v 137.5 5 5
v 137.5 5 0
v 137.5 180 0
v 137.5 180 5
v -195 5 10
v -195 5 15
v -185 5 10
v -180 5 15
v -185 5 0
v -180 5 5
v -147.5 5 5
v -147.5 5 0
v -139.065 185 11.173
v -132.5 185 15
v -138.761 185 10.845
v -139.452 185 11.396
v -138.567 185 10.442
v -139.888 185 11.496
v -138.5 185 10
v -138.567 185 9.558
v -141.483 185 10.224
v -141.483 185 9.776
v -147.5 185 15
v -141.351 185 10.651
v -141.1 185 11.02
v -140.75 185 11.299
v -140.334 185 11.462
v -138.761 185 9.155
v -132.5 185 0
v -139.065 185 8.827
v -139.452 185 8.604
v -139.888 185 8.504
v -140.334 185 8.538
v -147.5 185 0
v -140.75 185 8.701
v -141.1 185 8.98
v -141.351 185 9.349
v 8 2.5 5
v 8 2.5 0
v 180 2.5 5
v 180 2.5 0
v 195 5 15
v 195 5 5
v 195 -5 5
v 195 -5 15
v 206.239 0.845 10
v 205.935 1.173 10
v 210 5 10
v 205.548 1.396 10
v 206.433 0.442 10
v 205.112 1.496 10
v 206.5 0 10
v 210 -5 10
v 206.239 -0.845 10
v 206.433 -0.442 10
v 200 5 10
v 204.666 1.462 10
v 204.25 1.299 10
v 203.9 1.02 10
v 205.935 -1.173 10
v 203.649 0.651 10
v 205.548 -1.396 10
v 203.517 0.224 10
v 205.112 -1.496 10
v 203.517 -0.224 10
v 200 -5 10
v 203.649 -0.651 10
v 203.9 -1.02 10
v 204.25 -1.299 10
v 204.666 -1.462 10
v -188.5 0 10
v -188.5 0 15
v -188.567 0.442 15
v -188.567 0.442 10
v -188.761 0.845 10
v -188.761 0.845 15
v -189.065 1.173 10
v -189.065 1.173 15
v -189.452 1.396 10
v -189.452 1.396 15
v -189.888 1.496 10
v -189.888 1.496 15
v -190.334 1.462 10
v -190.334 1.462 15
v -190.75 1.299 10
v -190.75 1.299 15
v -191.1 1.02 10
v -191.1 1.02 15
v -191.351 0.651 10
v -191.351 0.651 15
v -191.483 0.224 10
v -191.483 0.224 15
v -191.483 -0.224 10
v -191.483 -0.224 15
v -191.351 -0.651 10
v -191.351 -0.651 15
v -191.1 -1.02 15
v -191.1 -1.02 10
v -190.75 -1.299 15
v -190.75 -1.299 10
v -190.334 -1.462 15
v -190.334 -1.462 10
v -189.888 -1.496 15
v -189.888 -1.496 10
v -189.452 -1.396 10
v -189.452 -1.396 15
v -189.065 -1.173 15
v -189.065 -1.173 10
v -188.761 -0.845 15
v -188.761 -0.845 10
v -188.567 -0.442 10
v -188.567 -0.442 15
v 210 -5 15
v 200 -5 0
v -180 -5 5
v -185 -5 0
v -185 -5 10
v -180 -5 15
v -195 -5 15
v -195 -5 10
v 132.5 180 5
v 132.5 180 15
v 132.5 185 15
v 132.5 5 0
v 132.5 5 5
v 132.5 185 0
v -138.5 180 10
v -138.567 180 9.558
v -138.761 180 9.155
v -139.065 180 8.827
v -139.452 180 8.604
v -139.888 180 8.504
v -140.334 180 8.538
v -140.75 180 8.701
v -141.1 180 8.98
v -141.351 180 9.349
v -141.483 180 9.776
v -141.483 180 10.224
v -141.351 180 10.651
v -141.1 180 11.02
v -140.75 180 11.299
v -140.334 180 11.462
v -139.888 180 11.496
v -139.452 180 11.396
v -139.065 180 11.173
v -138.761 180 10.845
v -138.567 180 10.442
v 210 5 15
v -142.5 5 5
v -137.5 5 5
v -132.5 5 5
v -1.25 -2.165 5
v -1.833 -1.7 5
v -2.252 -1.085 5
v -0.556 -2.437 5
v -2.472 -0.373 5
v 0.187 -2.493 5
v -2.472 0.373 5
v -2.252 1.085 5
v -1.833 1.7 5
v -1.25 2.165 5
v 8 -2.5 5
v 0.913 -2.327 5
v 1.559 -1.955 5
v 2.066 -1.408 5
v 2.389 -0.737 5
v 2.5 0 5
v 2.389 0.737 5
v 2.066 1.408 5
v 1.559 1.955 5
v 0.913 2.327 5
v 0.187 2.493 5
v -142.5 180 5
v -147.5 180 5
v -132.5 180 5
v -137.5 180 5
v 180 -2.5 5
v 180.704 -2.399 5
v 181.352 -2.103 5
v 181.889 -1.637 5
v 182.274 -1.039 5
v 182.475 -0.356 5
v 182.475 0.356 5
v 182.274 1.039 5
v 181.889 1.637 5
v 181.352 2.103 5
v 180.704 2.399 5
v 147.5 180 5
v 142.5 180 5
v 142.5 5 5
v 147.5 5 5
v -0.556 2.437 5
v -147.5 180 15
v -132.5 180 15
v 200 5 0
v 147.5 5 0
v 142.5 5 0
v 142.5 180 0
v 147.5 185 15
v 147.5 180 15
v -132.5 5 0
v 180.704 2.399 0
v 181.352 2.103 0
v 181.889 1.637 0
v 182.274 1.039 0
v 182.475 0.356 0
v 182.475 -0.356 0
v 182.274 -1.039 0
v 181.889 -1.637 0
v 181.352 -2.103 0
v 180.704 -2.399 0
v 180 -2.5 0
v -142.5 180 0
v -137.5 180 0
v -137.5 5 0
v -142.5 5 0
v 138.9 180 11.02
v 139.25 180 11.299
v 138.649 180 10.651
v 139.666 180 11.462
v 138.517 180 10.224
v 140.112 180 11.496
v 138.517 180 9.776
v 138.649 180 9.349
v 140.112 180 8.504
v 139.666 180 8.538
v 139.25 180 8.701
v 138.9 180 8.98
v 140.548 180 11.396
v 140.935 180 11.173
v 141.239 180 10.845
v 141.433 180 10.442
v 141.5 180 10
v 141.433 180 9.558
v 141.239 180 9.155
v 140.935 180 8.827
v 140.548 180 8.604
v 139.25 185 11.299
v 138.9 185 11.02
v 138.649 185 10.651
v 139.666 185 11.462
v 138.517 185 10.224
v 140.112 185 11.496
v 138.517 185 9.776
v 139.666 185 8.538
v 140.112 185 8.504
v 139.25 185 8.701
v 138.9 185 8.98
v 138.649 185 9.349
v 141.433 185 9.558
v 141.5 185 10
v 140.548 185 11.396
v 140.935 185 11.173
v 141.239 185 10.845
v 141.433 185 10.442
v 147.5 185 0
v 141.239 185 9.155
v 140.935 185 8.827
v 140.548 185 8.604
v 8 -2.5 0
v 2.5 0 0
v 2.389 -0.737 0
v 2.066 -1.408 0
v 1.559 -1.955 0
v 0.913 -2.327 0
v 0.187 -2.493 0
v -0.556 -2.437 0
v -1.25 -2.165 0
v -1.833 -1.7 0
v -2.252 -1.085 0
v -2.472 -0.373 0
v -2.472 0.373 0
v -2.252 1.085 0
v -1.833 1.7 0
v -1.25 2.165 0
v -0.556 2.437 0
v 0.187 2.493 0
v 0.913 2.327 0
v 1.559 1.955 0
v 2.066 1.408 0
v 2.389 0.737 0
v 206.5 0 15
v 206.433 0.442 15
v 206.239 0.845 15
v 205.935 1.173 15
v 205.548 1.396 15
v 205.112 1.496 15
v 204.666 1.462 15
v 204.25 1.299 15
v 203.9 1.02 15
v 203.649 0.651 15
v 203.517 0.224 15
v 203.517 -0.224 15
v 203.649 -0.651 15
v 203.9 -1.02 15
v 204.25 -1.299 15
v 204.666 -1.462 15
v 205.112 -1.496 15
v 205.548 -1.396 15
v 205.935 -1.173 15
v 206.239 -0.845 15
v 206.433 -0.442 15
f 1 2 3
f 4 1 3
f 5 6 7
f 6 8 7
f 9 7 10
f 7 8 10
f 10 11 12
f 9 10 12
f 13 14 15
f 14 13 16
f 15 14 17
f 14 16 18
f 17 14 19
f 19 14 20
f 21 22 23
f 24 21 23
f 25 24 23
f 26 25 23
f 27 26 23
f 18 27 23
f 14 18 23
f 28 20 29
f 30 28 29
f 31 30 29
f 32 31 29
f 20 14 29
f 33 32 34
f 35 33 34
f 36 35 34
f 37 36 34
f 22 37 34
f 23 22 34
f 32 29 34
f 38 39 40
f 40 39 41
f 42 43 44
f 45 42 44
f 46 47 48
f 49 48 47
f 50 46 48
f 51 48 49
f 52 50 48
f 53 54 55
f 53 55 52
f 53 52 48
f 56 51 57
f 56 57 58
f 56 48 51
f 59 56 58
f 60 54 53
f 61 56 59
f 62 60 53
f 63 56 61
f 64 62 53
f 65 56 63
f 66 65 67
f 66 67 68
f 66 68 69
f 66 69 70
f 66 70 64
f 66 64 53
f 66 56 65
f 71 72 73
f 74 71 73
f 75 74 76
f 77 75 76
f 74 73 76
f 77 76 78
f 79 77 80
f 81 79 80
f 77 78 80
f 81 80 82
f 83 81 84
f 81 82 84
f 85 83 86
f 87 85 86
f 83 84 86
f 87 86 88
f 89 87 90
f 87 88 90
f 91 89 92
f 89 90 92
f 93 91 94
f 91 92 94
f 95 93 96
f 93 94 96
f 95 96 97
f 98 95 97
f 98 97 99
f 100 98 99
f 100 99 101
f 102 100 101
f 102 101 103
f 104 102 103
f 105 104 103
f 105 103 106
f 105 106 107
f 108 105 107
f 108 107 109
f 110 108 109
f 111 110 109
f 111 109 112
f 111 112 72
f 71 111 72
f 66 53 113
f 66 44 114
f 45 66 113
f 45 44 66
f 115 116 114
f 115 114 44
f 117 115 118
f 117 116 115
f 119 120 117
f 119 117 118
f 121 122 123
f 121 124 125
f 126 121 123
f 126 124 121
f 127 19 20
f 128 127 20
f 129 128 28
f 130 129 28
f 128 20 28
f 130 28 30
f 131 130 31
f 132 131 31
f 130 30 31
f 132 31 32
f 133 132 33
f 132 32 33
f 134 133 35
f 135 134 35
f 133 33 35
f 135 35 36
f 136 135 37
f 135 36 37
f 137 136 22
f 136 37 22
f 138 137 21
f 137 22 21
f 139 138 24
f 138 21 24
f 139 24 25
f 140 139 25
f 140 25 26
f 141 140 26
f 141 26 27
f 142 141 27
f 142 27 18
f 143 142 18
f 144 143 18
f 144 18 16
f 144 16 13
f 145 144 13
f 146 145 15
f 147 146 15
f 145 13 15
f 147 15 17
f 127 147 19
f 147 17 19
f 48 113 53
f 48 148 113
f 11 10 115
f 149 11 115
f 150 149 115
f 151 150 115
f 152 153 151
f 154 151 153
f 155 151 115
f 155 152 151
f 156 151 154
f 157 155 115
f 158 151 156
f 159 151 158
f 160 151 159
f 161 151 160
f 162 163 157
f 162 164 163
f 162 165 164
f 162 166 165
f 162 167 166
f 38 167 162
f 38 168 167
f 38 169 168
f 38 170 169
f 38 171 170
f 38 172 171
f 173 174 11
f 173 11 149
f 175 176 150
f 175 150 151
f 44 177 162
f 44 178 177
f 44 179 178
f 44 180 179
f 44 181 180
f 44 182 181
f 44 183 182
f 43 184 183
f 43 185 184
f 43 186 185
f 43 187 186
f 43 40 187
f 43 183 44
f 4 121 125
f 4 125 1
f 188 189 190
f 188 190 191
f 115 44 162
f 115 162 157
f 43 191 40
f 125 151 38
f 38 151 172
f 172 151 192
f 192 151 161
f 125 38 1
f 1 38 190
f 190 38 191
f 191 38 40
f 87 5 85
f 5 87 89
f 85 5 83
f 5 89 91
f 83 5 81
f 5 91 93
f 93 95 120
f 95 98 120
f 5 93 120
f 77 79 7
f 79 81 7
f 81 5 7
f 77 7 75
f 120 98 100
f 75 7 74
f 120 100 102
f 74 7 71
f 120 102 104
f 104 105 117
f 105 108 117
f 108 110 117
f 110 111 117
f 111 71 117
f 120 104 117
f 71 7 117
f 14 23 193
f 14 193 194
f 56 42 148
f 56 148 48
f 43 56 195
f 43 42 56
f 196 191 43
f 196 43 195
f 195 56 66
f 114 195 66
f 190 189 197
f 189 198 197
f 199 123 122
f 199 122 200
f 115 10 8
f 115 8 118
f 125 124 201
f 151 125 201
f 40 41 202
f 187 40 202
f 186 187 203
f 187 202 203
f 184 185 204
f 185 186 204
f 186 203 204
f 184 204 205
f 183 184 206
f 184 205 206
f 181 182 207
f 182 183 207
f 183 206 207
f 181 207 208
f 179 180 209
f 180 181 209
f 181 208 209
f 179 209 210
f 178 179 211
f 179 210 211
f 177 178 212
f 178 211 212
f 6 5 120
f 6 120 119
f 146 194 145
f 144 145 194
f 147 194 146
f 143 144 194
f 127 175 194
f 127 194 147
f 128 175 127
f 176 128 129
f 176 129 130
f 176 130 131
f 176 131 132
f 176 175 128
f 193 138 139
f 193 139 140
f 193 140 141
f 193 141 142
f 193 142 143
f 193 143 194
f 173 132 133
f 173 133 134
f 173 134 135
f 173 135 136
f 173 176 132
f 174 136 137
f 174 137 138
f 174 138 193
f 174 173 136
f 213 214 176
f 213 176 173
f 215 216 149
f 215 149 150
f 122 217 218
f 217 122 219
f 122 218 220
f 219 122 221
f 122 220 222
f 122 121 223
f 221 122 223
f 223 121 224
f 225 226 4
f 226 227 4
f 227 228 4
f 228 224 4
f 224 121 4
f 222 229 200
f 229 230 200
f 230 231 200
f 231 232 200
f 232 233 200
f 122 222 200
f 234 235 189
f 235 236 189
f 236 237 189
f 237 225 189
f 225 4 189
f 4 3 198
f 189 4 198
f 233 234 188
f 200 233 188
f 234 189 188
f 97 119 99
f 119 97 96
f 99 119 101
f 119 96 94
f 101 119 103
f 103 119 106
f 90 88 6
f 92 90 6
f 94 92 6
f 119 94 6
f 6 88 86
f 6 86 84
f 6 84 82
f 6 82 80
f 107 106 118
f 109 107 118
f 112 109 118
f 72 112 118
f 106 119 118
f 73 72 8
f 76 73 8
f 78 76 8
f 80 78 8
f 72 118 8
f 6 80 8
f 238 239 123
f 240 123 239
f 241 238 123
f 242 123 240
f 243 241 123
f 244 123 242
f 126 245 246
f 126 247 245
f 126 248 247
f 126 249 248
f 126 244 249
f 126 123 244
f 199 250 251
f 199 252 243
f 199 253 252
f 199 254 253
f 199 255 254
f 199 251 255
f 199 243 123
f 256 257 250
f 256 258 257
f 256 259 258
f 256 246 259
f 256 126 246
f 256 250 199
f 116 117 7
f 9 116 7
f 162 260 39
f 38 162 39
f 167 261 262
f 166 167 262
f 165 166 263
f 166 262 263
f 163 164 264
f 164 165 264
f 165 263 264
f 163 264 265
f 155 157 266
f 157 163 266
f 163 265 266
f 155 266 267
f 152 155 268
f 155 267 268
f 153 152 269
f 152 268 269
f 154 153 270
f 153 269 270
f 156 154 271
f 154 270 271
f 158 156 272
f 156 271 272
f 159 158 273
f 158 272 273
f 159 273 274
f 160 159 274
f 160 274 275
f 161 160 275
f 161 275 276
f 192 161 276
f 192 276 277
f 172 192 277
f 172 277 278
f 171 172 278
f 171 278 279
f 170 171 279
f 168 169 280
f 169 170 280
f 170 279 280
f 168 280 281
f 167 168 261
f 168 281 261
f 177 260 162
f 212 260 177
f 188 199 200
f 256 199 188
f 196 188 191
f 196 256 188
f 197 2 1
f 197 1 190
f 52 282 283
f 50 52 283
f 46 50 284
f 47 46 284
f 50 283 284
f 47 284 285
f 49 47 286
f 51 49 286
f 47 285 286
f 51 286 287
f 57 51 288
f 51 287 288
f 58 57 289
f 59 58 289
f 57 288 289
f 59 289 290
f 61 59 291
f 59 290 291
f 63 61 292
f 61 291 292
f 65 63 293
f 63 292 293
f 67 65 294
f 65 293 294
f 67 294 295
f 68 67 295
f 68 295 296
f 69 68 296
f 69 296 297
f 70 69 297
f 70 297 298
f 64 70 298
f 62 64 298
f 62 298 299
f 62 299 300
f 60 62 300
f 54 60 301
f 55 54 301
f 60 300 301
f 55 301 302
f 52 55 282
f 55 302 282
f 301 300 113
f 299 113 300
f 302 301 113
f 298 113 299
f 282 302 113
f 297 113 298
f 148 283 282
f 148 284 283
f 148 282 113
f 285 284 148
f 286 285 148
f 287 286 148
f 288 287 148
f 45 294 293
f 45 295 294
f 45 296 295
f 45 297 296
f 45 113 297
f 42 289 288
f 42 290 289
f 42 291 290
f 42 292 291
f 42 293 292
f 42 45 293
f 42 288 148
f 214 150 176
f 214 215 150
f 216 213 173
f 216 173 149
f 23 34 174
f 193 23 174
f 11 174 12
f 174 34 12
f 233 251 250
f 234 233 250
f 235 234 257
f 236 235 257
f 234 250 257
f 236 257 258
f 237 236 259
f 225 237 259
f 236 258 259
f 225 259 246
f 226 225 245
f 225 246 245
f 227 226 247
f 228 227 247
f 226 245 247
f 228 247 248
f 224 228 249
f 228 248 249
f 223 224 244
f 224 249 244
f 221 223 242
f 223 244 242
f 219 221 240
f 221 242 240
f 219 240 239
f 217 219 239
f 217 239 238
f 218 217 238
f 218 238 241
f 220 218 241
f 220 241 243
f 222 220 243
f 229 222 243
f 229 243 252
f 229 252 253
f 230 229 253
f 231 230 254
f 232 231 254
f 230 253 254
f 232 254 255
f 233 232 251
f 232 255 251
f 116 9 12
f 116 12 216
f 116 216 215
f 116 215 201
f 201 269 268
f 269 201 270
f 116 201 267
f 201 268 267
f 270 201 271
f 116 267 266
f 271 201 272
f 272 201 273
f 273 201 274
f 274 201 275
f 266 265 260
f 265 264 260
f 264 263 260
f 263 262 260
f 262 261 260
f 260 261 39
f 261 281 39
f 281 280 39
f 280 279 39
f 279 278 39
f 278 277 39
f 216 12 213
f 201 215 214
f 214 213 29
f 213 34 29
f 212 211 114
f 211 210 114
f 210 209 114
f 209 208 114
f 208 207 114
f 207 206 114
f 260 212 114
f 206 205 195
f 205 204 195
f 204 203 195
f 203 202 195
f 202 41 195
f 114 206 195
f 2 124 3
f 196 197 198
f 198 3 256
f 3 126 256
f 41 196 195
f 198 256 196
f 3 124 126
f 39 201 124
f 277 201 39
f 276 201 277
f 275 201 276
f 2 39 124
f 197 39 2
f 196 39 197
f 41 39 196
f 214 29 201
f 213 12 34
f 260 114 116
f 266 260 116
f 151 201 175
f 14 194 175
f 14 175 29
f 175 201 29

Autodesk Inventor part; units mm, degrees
ref_plane "YZ Plane" through (0, 0, 0) normal (1, 0, 0) x (0, 1, 0)
ref_plane "XZ Plane" through (0, 0, 0) normal (0, 1, 0) x (-1, 0, 0)
ref_plane "XY Plane" through (0, 0, 0) normal (0, 0, 1) x (1, 0, 0)
sketch "Boceto1" plane through (0, 0, 0) normal (0, 0, 1) x (1, 0, 0)
  line L0 (5, -5) -> (165, -5)
  line L1 (165, -2.5) -> (8, -2.5)
  line L2 (8, -2.5) -> (8, 2.5)
  line L3 (8, 2.5) -> (165, 2.5)
  line L4 (140, 5) -> (142.5, 5)
  line L5 (142.5, 5) -> (137.5, 5)
  line L6 (137.5, 5) -> (137.5, 180)
  line L7 (142.5, 180) -> (142.5, 5)
  line L8 (132.5, 185) -> (147.5, 185)
  line L9 (147.5, 185) -> (147.5, 5)
  line L10 (142.5, 5) -> (137.5, 5)
  line L11 (132.5, 5) -> (132.5, 185)
  line L12 (137.5, 180) -> (142.5, 180)
  line L13 (147.5, 5) -> (165, 5)
  line L14 (0, 5) -> (132.5, 5)
  line L15 (137.5, 5) -> (142.5, 5)
  arc A0 (-165, 5) -> (-165, -5) centre (-165, 0) ccw
  line L16 (5, -5) -> (-165, -5)
  line L17 (-140, 5) -> (-142.5, 5)
  line L18 (-142.5, 5) -> (-137.5, 5)
  line L19 (-137.5, 5) -> (-137.5, 180)
  line L20 (-142.5, 180) -> (-142.5, 5)
  line L21 (-132.5, 185) -> (-147.5, 185)
  line L22 (-147.5, 185) -> (-147.5, 5)
  line L23 (-142.5, 5) -> (-137.5, 5)
  line L24 (-132.5, 5) -> (-132.5, 185)
  line L25 (-137.5, 180) -> (-142.5, 180)
  line L26 (-147.5, 5) -> (-165, 5)
  line L27 (0, 5) -> (-132.5, 5)
  line L28 (-137.5, 5) -> (-142.5, 5)
  line L29 (0, 0) -> (-5, 0) construction
  circle A1 centre (0, 0) radius 2.5
  arc A2 (180, -2.5) -> (180, 2.5) centre (180, 0) ccw
  line L30 (180, 5) -> (165, 5)
  line L31 (165, 2.5) -> (180, 2.5)
  line L32 (165, -2.5) -> (180, -2.5)
  line L33 (165, -5) -> (180, -5)
  arc A3 (180, -5) -> (180, 5) centre (180, 0) ccw
  dimension "d13" = 15
  dimension "d17" = 180
  dimension "d18" = 175
  dimension "d31" = 10
  dimension "d36" = 5
  dimension "d40" = 5
extrude "Extrusión1" add sketch "Boceto1" along normal blind 5
sketch "Sketch4" plane through (0, 0, 5) normal (0, 0, 1) x (1, 0, 0)
  line L0 (-132.5, 185) -> (-147.5, 185) projected
  line L1 (-132.5, 5) -> (-132.5, 185) projected
  line L2 (-147.5, 185) -> (-132.5, 185)
  line L3 (-132.5, 185) -> (-132.5, 180)
  line L4 (-132.5, 180) -> (-147.5, 180)
  line L5 (-147.5, 180) -> (-147.5, 185)
  line L6 (180, 5) -> (147.5, 5) projected
  line L7 (147.5, 5) -> (147.5, 185) projected
  line L8 (147.5, 185) -> (132.5, 185) projected
  line L9 (132.5, 185) -> (132.5, 5) projected
  line L10 (132.5, 5) -> (-132.5, 5) projected
  line L11 (-132.5, 5) -> (-132.5, 185) projected
  line L12 (-132.5, 185) -> (-147.5, 185) projected
  line L13 (-147.5, 185) -> (-147.5, 5) projected
  line L14 (-147.5, 5) -> (-165, 5) projected
  arc A0 (-165, 5) -> (-165, -5) centre (-165, 0) ccw projected
  line L15 (-165, -5) -> (180, -5) projected
  line L16 (-142.5, 5) -> (-142.5, 180) projected
  line L17 (-142.5, 180) -> (-137.5, 180) projected
  line L18 (-137.5, 180) -> (-137.5, 5) projected
  line L19 (-137.5, 5) -> (-142.5, 5) projected
  line L20 (142.5, 180) -> (142.5, 5) projected
  line L21 (142.5, 5) -> (137.5, 5) projected
  line L22 (137.5, 5) -> (137.5, 180) projected
  line L23 (137.5, 180) -> (142.5, 180) projected
  line L24 (132.5, 185) -> (147.5, 185)
  line L25 (147.5, 185) -> (147.5, 180)
  line L26 (147.5, 180) -> (132.5, 180)
  line L27 (132.5, 180) -> (132.5, 185)
  arc A1 (180, -5) -> (180, 5) centre (180, 0) ccw projected
  point P0 (0, 0)
  dimension "d26" = 5
extrude "Extrusion3" add sketch "Sketch4" along normal blind 10 contours L1 L4 L5 L0 | L9 L8 L7 L26 L23
sketch "Sketch5" plane through (0, 0, 5) normal (0, 0, 1) x (1, 0, 0)
  line L0 (180, -2.5) -> (8, -2.5) projected
  line L1 (8, -2.5) -> (8, 2.5) projected
  line L2 (8, 2.5) -> (180, 2.5) projected
  arc A0 (180, -2.5) -> (180, 2.5) centre (180, 0) ccw projected
  circle A1 centre (0, 0) radius 2.5 projected
  line L3 (147.5, 180) -> (142.5, 180) projected
  line L4 (142.5, 180) -> (142.5, 5) projected
  line L5 (142.5, 5) -> (137.5, 5) projected
  line L6 (137.5, 5) -> (137.5, 180) projected
  line L7 (137.5, 180) -> (132.5, 180) projected
  line L8 (132.5, 180) -> (132.5, 5) projected
  line L9 (132.5, 5) -> (-132.5, 5) projected
  line L10 (-132.5, 5) -> (-132.5, 180) projected
  line L11 (-132.5, 180) -> (-137.5, 180) projected
  line L12 (-137.5, 180) -> (-137.5, 5) projected
  line L13 (-137.5, 5) -> (-142.5, 5) projected
  line L14 (-142.5, 5) -> (-142.5, 180) projected
  line L15 (-142.5, 180) -> (-147.5, 180) projected
  line L16 (-147.5, 180) -> (-147.5, 5) projected
  line L17 (-147.5, 5) -> (-165, 5) projected
  arc A2 (-165, 5) -> (-165, -5) centre (-165, 0) ccw projected
  line L18 (-165, -5) -> (180, -5) projected
  arc A3 (180, -5) -> (180, 5) centre (180, 0) ccw projected
  line L19 (180, 5) -> (147.5, 5) projected
  line L20 (147.5, 5) -> (147.5, 180) projected
  arc A4 (-165, 5) -> (-165, -5) centre (-165, 0) ccw projected
  line L21 (-165, -5) -> (-185, -5)
  line L22 (-185, -5) -> (-185, 5)
  line L23 (-185, 5) -> (-165, 5)
  line L24 (-165, 5) -> (-165, -5)
  arc A5 (180, -5) -> (180, 5) centre (180, 0) ccw projected
  line L25 (180, 5) -> (200, 5)
  line L26 (200, 5) -> (200, -5)
  line L27 (200, -5) -> (180, -5)
  dimension "d42" = 20
  dimension "d45" = 20
extrude "Extrusion4" add sketch "Sketch5" against normal up to surface (5 mm away) contours L25 L26 L27 A3 | L21 L22 L23 A2 | A2 L24
sketch "Sketch6" plane through (0, 0, 5) normal (0, 0, 1) x (1, 0, 0)
  line L0 (-147.5, 180) -> (-132.5, 180) projected
  line L1 (-132.5, 180) -> (-132.5, 185) projected
  line L2 (-132.5, 185) -> (-147.5, 185) projected
  line L3 (-147.5, 185) -> (-147.5, 180) projected
  line L4 (-147.5, 5) -> (-185, 5) projected
  line L5 (200, -5) -> (-185, -5) projected
  line L6 (-185, 5) -> (-180, 5)
  line L7 (-180, 5) -> (-180, -5)
  line L8 (-180, -5) -> (-185, -5)
  line L9 (-185, -5) -> (-185, 5)
  line L10 (200, -5) -> (200, 5) projected
  line L11 (200, 5) -> (195, 5)
  line L12 (195, 5) -> (195, -5)
  line L13 (195, -5) -> (200, -5)
  line L14 (200, -5) -> (200, 5)
  point P0 (0, 0)
  dimension "d46" = 15
  dimension "d47" = 5
  dimension "d48" = 5
  dimension "d49" = 5
  dimension "d50" = 10
extrude "Extrusion5" add sketch "Sketch6" along normal up to surface (10 mm away) contours L7 L5 L9 L4 | L12 L11 L10 L5
sketch "Sketch7" plane through (-185, -5, 0) normal (-1, 0, 0) x (0, 0, 1)
  line L0 (15, 0) -> (15, 10) projected
  line L1 (0, 0) -> (15, 0) projected
  line L2 (15, 10) -> (10, 10)
  line L3 (10, 10) -> (10, 0)
  line L4 (10, 0) -> (15, 0)
  line L5 (15, 0) -> (15, 10)
  point P0 (0, 5)
  dimension "d53" = 5
extrude "Extrusion6" add sketch "Sketch7" along normal blind 10
sketch "Sketch8" plane through (200, -5, 0) normal (1, 0, 0) x (0, 0, -1)
  line L0 (-10, 10) -> (-10, 0) projected
  line L1 (-10, 0) -> (-15, 0) projected
  line L2 (-15, 0) -> (-15, 10) projected
  line L3 (-15, 10) -> (-10, 10) projected
  point P0 (0, 5)
extrude "Extrusion7" add sketch "Sketch8" along normal blind 10
sketch "Sketch9" plane through (-180, -5, 15) normal (0, 0, 1) x (1, 0, 0)
  line L0 (32.5, 10) -> (-5, 10) projected
  line L1 (0, 0) -> (375, 0) projected
  line L2 (-5, 0) -> (-5, 10) projected
  line L3 (0, 0) -> (-15, 0) projected
  line L4 (0, 10) -> (0, 0) projected
  line L5 (0, 10) -> (-15, 10) projected
  line L6 (-15, 0) -> (-15, 10) projected
  line L7 (-15, 10) -> (-5, 10) construction
  line L8 (-5, 10) -> (-5, 0) construction
  line L9 (-5, 0) -> (-15, 0) construction
  line L10 (-15, 0) -> (-15, 10) construction
  circle A0 centre (-10, 5) radius 1.5
  line L11 (375, 10) -> (390, 10) projected
  line L12 (375, 0) -> (375, 10) projected
  line L13 (375, 0) -> (390, 0) projected
  line L14 (390, 10) -> (390, 0) projected
  line L15 (380, 10) -> (380, 0) projected
  line L16 (327.5, 10) -> (380, 10) construction
  line L17 (375, 0) -> (390, 0) construction
  line L18 (380, 10) -> (390, 10) construction
  line L19 (390, 10) -> (390, 0) construction
  line L20 (390, 0) -> (380, 0) construction
  line L21 (380, 0) -> (380, 10) construction
  circle A1 centre (385, 5) radius 1.5
  point P0 (180, 5)
  dimension "d58" = 3
  dimension "d61" = 3
extrude "Extrusion8" cut sketch "Sketch9" against normal blind 10 contours A0 | A1
sketch "Sketch10" plane through (-147.5, 185, 0) normal (0, 1, 0) x (1, 0, 0)
  line L0 (342.5, -5) -> (295, -5) projected
  line L1 (295, -5) -> (290, -5) projected
  line L2 (290, -5) -> (285, -5) projected
  line L3 (285, -5) -> (280, -5) projected
  line L4 (280, -5) -> (15, -5) projected
  line L5 (15, -5) -> (10, -5) projected
  line L6 (10, -5) -> (5, -5) projected
  line L7 (5, -5) -> (0, -5) projected
  line L8 (0, -5) -> (-32.5, -5) projected
  line L9 (-32.5, -5) -> (342.5, -5) projected
  line L10 (150, -5) -> (145, -5) projected
  line L11 (327.5, -5) -> (155.5, -5) projected
  line L12 (155.5, -5) -> (327.5, -5) projected
  line L13 (327.5, -5) -> (327.5, -5) projected
  line L14 (15, 0) -> (15, -15) construction
  line L15 (0, -5) -> (15, -5) construction
  line L16 (15, -5) -> (15, -15) construction
  line L17 (15, -15) -> (0, -15) construction
  line L18 (0, -15) -> (0, -5) construction
  line L19 (295, 0) -> (295, -15) construction
  line L20 (295, -15) -> (280, -15) construction
  line L21 (280, -15) -> (280, -5) construction
  line L22 (280, -5) -> (295, -5) construction
  line L23 (295, -5) -> (295, -15) construction
  circle A0 centre (7.5, -10) radius 1.5
  circle A1 centre (287.5, -10) radius 1.5
  point P0 (147.5, 0)
  dimension "d62" = 3
  dimension "d63" = 3
extrude "Extrusion9" cut sketch "Sketch10" against normal blind 10
properties part number "Bancada"
